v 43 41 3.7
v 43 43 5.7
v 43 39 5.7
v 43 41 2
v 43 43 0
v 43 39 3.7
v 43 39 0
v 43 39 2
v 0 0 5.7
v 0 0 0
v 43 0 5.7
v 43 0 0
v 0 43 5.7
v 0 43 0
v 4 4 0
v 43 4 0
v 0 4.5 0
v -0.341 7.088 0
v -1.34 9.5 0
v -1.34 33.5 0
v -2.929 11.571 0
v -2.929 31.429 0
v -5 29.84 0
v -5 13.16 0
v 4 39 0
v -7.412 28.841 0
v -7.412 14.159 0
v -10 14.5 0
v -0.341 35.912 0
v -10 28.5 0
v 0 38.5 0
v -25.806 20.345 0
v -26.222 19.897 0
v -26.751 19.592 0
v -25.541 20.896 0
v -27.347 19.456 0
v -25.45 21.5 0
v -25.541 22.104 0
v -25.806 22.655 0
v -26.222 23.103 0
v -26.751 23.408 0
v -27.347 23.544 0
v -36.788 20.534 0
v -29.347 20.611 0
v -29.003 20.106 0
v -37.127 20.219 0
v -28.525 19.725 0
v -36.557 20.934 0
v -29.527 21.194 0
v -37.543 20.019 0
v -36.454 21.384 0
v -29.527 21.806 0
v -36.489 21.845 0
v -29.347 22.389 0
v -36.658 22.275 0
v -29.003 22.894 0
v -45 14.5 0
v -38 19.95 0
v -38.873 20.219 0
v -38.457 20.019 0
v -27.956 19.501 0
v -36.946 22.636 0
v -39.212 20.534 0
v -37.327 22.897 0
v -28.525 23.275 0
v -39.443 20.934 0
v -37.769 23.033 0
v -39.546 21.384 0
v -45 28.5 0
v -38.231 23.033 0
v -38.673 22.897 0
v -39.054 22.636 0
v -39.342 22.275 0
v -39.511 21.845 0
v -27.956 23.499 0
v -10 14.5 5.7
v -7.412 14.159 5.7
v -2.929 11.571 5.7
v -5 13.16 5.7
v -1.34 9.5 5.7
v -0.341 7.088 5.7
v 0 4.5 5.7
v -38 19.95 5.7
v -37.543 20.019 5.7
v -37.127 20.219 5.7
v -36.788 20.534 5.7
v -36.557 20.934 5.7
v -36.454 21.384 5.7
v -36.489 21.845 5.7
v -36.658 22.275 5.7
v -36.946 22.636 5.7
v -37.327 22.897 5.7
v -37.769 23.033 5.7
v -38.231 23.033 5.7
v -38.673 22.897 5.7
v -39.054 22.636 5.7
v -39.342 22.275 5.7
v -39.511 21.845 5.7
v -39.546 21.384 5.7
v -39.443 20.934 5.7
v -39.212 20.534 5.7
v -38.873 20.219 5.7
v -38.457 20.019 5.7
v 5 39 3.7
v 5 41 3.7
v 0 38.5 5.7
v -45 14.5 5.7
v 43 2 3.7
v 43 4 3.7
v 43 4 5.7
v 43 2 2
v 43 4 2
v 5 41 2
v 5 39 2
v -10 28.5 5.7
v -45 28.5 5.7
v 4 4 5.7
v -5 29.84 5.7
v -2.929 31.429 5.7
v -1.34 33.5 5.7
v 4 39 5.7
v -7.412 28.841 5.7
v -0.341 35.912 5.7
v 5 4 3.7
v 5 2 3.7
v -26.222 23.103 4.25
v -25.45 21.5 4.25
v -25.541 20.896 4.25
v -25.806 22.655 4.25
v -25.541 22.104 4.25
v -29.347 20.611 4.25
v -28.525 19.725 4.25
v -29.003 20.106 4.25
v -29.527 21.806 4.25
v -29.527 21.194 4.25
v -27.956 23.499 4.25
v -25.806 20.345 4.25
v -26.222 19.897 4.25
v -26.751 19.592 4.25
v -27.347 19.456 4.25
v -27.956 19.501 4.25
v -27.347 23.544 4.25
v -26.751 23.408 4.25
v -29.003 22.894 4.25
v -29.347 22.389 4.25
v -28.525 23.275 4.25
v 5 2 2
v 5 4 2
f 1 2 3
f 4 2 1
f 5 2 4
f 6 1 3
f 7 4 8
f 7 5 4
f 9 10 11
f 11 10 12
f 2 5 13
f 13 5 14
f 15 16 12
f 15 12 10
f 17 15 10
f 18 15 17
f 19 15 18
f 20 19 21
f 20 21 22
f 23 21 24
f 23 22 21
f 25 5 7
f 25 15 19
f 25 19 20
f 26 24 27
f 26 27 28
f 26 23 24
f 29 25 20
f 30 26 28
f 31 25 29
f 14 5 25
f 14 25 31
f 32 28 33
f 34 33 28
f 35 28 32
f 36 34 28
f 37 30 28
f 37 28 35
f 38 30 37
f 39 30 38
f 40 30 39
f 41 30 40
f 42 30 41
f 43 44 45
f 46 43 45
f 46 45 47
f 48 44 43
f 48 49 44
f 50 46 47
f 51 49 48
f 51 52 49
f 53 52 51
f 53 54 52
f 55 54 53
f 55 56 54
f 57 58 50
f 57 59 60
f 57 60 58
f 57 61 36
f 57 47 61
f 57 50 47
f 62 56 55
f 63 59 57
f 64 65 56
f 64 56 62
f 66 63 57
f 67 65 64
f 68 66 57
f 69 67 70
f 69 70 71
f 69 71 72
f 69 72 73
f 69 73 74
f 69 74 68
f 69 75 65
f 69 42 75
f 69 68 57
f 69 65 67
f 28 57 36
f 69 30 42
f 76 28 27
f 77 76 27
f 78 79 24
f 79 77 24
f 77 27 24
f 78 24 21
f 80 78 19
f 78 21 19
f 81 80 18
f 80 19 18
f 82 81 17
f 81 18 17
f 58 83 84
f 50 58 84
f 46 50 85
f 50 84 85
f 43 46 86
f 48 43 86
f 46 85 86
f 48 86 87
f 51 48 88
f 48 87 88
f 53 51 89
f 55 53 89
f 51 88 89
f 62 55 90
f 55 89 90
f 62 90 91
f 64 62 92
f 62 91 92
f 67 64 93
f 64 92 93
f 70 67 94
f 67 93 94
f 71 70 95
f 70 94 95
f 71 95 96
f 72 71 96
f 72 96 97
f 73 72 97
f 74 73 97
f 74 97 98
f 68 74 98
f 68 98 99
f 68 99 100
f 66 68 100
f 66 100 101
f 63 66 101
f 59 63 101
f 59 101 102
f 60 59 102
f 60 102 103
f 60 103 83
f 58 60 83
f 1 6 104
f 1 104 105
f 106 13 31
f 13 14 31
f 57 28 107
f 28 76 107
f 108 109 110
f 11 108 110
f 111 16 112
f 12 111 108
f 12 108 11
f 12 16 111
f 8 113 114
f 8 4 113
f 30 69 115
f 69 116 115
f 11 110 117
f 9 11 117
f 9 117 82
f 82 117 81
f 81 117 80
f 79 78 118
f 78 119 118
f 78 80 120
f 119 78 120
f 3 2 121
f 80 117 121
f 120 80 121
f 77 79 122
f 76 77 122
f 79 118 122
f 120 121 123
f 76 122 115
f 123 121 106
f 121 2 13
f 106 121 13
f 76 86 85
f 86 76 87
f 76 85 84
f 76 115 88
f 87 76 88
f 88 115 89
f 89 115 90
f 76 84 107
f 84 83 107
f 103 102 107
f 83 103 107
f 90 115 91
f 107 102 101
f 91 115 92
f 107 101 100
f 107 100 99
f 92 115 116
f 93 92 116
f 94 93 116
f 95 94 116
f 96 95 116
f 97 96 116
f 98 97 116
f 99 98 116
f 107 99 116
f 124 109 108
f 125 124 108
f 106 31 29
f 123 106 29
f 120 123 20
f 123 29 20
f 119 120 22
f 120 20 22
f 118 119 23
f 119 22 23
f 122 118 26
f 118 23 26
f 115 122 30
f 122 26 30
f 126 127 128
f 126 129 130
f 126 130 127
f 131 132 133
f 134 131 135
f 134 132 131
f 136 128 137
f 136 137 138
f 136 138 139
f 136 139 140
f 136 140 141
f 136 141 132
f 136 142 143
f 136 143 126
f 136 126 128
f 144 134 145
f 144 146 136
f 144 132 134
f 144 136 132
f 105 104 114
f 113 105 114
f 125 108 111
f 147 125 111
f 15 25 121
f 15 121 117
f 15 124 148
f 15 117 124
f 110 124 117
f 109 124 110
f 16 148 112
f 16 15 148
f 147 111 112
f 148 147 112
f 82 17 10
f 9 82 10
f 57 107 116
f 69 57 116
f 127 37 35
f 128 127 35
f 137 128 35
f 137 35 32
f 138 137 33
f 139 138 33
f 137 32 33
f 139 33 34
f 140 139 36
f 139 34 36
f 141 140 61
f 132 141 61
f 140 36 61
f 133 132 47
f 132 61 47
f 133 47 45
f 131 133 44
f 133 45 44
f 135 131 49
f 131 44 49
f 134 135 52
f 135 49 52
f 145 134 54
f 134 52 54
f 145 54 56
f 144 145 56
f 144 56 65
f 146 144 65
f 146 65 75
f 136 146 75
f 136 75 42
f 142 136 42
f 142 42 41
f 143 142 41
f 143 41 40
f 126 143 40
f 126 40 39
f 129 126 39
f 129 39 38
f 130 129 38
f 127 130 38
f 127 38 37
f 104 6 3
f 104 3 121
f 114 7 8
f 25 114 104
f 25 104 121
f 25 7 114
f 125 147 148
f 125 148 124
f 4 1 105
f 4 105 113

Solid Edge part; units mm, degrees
sketch "Sketch1" plane through (0, 0, 0) normal (0, 0, 1) x (1, 0, 0)
  line L0 (4, 39) -> (4, 4)
  line L1 (4, 4) -> (43, 4)
  line L2 (43, 4) -> (43, 0)
  line L3 (0, 0) -> (43, 0)
  line L4 (0, 43) -> (0, 0)
  line L5 (43, 43) -> (0, 43)
  line L6 (43, 43) -> (43, 39)
  line L7 (43, 39) -> (4, 39)
extrude "Protrusion1" add sketch "Sketch1" along normal blind 5.7
sketch "Sketch2" plane through (43, 41, 2.85) normal (1, 0, 0) x (0, 1, 0)
  line L0 (-2, 0.85) -> (0, 0.85)
  line L1 (0, 0.85) -> (0, -0.85)
  line L2 (0, -0.85) -> (-2, -0.85)
  line L3 (-2, -0.85) -> (-2, 0.85)
  line L4 (-37, -0.85) -> (-37, 0.85)
  line L5 (-37, 0.85) -> (-39, 0.85)
  line L6 (-39, 0.85) -> (-39, -0.85)
  line L7 (-39, -0.85) -> (-37, -0.85)
  dimension "D1" = 1.7
  dimension "D2" = 2
extrude "VaciadoExtruido_1" cut sketch "Sketch2" against normal blind 38
sketch "Sketch3" plane through (21.5, 21.5, 5.7) normal (0, 0, 1) x (1, 0, 0)
  line L0 (-66.5, 7) -> (-21.5, 7)
  line L1 (-21.5, 7) -> (-21.5, -7)
  line L2 (-21.5, -7) -> (-66.5, -7)
  line L3 (-66.5, -7) -> (-66.5, 7)
extrude "VaciadoExtruido_2" add sketch "Sketch3" against normal blind 5.7
sketch "Sketch4" plane through (11, 21.5, 0) normal (0, 0, -1) x (1, 0, 0)
  circle A0 centre (-38.5, 0) radius 2.05
extrude "VaciadoExtruido_3" cut sketch "Sketch4" against normal blind 4.25
sketch "Sketch5" plane through (11, 21.5, 5.7) normal (0, 0, 1) x (0, -1, 0)
  circle A0 centre (0, -49) radius 1.55
extrude "Cutout1" cut sketch "Sketch5" against normal up to next
fillet "Redondeo_1" radius 10 2 edges at (0, 14.5, 2.85) (0, 28.5, 2.85)
